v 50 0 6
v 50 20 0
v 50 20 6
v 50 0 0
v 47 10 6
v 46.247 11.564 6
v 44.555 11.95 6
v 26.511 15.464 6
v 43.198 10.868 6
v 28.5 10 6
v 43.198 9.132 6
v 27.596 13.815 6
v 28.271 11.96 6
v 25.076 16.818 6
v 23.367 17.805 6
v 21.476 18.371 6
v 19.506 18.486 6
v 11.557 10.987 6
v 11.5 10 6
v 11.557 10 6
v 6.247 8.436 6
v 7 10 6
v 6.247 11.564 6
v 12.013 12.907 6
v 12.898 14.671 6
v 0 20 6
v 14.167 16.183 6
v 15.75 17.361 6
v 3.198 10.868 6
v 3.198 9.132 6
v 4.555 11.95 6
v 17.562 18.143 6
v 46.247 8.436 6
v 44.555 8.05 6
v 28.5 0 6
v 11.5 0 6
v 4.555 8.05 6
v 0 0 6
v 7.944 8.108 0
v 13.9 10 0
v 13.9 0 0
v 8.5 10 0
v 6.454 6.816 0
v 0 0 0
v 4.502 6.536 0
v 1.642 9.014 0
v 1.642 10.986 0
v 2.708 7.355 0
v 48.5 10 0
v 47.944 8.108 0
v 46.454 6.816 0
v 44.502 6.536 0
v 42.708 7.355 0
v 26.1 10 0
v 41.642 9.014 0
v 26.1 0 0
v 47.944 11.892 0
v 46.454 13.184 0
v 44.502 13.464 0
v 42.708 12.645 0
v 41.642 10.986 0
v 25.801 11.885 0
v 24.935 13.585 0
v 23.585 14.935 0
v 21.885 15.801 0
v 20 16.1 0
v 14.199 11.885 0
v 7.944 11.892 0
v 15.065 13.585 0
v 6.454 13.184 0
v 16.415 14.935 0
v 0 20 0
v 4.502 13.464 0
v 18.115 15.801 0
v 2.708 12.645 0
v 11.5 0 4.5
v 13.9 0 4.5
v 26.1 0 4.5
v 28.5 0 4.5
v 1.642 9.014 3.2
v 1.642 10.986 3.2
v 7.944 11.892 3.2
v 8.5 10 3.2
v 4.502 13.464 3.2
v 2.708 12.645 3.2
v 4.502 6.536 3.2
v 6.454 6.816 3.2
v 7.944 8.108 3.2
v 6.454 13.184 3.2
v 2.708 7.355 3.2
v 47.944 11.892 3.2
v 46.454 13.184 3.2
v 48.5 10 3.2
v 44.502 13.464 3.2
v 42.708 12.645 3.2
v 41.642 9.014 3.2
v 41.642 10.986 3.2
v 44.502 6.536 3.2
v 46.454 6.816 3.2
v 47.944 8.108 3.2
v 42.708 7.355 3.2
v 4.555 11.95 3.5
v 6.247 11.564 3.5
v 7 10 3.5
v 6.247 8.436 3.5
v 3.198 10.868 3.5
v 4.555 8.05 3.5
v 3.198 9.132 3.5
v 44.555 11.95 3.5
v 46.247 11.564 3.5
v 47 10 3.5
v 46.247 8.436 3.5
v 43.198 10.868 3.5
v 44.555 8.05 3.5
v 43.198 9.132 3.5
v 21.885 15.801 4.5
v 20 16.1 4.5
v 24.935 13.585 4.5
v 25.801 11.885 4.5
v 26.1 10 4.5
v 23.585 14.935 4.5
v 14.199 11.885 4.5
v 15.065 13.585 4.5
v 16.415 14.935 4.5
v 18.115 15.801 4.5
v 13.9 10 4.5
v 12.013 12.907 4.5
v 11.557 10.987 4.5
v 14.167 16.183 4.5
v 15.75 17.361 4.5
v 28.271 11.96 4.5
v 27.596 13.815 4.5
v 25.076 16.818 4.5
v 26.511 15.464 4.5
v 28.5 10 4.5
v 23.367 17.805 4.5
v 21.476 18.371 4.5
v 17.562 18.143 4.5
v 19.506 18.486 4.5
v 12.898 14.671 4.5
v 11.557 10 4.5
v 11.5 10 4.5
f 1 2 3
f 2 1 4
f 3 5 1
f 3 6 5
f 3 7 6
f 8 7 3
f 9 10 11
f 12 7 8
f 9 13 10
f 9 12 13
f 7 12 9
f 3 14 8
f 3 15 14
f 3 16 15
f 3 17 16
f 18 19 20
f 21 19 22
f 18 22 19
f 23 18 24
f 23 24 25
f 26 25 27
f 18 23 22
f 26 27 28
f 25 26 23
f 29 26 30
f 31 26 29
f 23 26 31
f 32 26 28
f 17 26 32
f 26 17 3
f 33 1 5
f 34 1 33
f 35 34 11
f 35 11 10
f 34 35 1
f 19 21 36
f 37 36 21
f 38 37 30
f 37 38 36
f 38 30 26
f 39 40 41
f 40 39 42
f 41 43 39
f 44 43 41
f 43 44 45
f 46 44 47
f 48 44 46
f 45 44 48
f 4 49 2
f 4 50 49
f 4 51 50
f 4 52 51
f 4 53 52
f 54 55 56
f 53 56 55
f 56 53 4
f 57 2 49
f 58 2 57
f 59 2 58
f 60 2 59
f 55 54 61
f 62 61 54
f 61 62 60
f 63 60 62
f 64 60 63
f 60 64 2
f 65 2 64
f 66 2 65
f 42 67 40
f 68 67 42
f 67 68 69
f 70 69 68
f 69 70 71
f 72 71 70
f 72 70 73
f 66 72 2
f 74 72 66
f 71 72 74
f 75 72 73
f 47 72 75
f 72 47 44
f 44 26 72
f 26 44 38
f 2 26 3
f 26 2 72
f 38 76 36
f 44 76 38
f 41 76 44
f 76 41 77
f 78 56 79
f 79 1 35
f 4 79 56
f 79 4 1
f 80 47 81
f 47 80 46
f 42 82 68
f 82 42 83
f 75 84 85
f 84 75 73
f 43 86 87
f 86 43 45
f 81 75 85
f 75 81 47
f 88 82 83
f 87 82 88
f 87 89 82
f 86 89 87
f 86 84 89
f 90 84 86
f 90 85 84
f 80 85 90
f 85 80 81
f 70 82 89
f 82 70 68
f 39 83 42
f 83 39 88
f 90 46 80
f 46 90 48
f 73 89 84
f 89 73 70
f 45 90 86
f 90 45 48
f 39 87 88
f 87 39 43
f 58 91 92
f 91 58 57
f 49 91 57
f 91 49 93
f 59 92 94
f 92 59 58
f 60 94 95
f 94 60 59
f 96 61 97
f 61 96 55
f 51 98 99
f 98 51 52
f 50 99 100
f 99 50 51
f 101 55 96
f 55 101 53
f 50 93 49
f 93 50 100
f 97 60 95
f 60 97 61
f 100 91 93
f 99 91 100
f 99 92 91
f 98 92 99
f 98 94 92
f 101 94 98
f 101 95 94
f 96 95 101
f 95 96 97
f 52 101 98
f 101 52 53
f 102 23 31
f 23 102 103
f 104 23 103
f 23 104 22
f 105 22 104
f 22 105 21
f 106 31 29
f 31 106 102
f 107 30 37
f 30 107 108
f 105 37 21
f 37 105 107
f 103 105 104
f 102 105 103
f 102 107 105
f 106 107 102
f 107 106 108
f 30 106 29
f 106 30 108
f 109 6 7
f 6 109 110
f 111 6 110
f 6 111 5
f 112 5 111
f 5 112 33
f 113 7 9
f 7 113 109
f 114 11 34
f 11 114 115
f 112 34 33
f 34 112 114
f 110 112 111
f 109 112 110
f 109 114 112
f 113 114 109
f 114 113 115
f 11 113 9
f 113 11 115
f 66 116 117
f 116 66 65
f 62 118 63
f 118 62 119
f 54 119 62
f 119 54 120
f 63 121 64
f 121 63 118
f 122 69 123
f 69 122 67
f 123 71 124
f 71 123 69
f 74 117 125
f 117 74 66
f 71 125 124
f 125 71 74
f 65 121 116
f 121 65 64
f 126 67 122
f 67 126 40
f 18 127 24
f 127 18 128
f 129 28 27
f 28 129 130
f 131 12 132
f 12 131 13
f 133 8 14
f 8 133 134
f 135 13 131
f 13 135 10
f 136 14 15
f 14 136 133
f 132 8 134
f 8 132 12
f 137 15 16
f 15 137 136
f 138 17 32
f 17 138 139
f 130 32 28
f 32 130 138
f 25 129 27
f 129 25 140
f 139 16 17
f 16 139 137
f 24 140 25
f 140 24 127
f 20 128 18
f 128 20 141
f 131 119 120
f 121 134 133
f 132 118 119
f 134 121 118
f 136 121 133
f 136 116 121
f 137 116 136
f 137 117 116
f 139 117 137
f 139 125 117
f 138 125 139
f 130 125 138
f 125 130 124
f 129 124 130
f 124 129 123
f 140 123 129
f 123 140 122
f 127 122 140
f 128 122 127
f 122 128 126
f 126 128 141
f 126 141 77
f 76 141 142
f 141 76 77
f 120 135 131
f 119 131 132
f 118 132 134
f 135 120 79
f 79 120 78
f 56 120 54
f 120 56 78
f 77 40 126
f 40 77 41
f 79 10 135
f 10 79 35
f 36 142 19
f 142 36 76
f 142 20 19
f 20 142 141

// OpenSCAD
difference(){
cube([50,20,6]);

translate([5,10,0])cylinder(r=3.5,h=3.2);
translate([45,10,0])cylinder(r=3.5,h=3.2);

translate([5,10,3.5])cylinder(r=2,h=3.5);
translate([45,10,3.5])cylinder(r=2,h=3.5);


translate([20,10,0])cylinder(r=6.1,h=10);
translate([20,10,4.5])cylinder(r=8.5,h=10);

translate([20-6.1,0,0]) cube([12.2,10,10]);

translate([20-8.5,0,4.5]) cube([17,10,10]);
}
